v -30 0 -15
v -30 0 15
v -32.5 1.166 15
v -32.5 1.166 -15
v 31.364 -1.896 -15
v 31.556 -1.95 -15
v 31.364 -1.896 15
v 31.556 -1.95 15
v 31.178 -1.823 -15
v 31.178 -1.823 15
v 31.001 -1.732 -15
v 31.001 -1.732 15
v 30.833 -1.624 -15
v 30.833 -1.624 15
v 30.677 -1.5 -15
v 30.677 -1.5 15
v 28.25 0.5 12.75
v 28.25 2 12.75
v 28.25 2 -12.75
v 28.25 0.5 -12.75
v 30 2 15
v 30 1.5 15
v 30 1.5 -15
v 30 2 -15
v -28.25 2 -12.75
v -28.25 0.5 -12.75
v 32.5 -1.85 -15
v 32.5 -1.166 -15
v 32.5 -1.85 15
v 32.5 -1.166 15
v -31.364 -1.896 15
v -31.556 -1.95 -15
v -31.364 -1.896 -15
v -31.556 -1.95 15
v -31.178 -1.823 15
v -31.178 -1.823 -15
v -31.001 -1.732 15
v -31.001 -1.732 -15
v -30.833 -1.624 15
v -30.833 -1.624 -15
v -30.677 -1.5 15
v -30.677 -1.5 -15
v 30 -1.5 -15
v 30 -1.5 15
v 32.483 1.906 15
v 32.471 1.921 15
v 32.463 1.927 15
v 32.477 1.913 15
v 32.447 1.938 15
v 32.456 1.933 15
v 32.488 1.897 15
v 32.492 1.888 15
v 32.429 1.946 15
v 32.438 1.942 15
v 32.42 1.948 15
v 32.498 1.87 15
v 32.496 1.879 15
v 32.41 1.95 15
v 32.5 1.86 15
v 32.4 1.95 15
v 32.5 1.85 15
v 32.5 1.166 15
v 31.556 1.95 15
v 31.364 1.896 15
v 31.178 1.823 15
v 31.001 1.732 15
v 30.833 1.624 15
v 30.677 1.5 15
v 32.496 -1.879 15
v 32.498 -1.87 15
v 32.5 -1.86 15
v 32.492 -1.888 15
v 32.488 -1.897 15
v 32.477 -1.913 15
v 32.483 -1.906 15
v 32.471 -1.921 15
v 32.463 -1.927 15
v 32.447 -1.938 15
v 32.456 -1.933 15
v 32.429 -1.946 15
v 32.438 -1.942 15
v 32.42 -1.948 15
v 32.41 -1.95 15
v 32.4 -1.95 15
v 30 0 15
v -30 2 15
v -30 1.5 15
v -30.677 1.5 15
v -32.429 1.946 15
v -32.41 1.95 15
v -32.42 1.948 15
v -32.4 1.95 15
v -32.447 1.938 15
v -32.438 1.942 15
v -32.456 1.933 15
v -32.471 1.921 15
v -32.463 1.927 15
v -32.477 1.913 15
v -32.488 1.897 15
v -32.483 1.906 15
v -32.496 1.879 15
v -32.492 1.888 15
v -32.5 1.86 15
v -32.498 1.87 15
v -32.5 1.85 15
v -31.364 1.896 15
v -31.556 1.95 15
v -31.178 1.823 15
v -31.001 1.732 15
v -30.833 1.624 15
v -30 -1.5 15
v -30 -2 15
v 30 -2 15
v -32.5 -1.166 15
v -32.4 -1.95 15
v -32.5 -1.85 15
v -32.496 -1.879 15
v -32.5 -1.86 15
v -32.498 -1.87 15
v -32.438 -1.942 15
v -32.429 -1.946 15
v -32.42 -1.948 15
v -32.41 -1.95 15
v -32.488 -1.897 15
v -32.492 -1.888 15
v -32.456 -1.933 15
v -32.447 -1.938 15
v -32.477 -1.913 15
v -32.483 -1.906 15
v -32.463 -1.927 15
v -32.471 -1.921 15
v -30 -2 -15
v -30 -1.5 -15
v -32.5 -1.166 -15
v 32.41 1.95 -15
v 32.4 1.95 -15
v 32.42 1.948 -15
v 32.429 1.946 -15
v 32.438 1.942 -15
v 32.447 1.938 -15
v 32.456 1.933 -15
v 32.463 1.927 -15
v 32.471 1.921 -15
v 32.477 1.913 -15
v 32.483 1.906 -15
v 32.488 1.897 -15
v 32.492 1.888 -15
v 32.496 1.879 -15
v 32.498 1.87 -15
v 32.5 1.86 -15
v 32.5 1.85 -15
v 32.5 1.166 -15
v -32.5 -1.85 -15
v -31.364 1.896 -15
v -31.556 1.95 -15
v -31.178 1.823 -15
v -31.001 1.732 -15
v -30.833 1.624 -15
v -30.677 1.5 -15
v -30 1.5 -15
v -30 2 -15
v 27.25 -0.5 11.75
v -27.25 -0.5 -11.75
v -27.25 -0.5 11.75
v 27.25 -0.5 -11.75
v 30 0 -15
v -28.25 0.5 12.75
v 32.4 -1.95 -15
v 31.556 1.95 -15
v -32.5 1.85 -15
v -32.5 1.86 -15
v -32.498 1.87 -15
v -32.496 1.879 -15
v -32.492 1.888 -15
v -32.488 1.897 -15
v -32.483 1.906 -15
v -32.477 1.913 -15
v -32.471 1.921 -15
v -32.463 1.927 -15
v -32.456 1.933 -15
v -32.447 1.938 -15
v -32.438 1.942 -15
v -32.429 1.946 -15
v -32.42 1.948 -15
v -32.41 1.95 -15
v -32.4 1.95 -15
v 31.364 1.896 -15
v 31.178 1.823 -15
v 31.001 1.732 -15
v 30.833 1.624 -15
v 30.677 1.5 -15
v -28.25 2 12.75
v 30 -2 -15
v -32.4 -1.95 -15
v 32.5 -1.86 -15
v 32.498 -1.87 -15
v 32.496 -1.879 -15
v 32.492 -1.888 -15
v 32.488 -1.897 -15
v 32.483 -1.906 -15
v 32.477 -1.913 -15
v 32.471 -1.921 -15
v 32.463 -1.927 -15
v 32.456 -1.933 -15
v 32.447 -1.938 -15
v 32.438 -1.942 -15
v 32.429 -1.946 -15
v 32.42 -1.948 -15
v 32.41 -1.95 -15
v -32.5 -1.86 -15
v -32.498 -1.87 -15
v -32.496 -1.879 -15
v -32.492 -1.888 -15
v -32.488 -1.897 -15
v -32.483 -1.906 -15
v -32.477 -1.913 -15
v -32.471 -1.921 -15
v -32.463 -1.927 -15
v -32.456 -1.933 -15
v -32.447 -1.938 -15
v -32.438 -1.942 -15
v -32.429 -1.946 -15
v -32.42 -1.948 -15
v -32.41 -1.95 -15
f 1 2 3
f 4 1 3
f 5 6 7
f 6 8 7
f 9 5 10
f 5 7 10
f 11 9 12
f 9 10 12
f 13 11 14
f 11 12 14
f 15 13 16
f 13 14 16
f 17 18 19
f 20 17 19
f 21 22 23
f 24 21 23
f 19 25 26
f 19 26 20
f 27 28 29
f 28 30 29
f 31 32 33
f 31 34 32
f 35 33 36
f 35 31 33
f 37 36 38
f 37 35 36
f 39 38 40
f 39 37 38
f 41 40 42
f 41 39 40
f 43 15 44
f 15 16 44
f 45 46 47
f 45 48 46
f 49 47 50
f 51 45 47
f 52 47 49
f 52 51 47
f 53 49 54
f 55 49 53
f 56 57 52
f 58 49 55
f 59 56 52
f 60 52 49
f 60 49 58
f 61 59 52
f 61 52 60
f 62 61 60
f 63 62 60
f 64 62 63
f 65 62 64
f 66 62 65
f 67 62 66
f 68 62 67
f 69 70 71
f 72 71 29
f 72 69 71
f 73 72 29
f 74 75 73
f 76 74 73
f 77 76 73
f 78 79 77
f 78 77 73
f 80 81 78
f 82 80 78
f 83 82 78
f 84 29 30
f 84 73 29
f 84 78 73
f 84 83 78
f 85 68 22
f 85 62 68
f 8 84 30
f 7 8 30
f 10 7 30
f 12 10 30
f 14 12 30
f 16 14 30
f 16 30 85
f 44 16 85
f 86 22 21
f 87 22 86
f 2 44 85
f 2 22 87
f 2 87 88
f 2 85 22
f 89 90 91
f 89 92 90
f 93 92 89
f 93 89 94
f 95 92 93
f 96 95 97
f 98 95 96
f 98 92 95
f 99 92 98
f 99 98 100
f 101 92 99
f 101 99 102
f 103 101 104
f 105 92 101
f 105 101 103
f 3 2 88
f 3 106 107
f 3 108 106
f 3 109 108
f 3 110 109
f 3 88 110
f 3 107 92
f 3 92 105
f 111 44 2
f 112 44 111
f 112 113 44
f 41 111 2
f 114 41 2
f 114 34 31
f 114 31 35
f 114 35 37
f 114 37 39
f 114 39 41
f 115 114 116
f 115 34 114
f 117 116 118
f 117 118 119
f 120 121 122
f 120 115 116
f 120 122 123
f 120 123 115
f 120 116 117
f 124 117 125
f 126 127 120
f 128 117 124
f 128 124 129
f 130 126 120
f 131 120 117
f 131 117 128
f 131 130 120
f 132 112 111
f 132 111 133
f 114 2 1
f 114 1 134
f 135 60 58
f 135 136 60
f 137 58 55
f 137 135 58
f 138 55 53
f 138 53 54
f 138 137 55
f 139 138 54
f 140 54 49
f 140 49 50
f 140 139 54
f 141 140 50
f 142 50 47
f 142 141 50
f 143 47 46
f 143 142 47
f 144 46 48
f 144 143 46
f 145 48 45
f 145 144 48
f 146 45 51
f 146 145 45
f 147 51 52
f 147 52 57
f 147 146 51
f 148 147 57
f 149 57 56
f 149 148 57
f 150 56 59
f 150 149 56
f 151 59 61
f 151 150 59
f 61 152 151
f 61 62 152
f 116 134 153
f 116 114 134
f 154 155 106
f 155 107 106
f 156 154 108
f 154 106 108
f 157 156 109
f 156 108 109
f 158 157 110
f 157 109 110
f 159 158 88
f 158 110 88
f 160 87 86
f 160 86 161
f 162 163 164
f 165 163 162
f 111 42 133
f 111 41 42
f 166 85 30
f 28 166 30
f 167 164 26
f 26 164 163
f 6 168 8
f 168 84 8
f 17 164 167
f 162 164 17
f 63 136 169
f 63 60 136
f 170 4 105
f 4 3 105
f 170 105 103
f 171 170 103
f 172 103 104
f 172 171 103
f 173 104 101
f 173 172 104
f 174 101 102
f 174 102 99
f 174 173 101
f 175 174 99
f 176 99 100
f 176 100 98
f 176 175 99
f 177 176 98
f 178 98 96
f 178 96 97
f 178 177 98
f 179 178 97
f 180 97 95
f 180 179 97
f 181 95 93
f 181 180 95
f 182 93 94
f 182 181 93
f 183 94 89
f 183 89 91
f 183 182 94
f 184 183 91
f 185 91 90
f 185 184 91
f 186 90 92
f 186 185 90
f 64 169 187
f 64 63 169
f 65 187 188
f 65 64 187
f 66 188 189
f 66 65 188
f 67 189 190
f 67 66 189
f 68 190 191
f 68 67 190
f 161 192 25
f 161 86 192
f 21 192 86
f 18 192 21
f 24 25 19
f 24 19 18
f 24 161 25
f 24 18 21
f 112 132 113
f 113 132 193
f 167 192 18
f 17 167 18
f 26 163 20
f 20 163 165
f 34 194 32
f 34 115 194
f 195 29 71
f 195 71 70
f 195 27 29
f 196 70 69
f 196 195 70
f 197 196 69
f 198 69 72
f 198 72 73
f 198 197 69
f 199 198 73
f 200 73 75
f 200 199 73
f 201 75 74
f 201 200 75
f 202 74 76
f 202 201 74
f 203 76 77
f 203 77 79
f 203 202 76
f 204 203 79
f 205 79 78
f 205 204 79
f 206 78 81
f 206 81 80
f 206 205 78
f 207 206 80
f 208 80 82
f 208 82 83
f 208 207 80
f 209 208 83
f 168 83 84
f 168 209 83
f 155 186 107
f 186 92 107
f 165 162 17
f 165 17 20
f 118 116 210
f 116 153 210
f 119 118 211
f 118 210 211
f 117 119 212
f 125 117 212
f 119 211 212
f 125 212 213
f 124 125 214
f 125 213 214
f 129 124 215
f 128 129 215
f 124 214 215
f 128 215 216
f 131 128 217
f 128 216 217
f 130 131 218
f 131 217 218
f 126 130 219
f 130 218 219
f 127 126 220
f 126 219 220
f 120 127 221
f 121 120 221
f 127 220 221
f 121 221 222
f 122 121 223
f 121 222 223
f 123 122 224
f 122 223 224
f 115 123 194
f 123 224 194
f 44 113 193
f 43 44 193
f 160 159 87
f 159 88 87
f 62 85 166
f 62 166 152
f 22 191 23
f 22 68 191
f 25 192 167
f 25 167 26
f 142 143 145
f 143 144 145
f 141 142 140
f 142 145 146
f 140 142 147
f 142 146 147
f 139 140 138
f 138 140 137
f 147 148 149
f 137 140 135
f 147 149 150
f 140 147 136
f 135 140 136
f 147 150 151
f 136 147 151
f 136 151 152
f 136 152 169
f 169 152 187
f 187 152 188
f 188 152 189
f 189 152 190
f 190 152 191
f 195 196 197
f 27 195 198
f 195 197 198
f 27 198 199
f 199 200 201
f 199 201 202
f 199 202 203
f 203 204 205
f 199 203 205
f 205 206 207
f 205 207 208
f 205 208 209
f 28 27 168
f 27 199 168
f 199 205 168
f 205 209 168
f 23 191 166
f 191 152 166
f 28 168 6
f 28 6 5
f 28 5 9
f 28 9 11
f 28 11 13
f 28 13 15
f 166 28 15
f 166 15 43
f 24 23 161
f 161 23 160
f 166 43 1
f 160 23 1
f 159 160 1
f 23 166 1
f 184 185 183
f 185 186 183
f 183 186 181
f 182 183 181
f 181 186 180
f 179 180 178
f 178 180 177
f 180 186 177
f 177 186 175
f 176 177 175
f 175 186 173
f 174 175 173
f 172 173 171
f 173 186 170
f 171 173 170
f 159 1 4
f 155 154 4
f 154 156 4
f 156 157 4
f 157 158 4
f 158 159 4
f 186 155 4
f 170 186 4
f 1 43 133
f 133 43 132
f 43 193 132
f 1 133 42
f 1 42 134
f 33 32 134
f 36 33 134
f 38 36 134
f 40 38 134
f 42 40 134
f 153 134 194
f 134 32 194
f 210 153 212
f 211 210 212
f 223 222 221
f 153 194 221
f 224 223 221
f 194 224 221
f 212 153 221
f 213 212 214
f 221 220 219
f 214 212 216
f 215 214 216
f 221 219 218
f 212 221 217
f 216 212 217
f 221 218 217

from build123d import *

# Parameters (mm, degrees)
EXTRUDE_1_DEPTH       = 2
EXTRUDE_1_DEPTH_BACK  = 2
SKETCH_1_W            = 60
SKETCH_1_H            = 30
SKETCH_2_W            = 56.5
SKETCH_2_H            = 25.5
CUT_EXTRUDE_1_DEPTH   = 2.5
CHAMFER_1_SIZE        = 1
EXTRUDE_2_DEPTH       = 15
MIRROR_2_COPY_1_DEPTH = 15
FILLET_1_R            = 0.1


with BuildPart() as part:
    # 草图1 → 凸台-拉伸1 (new, two sides: drawn at the far end of the back side and taken through both)
    with BuildSketch(Plane(origin=(0, 0, 0), x_dir=(1, 0, 0), z_dir=(0, 1, 0)).offset(-EXTRUDE_1_DEPTH_BACK)):
        Rectangle(SKETCH_1_W, SKETCH_1_H)
    extrude(amount=EXTRUDE_1_DEPTH + EXTRUDE_1_DEPTH_BACK)

    # 草图2 → 切除-拉伸1 (cut)
    with BuildSketch(Plane(origin=(0, 2, 0), x_dir=(1, 0, 0), z_dir=(0, 1, 0))):
        Rectangle(SKETCH_2_W, SKETCH_2_H)
    extrude(amount=-CUT_EXTRUDE_1_DEPTH, mode=Mode.SUBTRACT)

    # 倒角1
    chamfer_1_edges = [part.edges().sort_by_distance(p)[0] for p in [
        (0, -0.5, -12.75),
        (28.25, -0.5, 0),
        (0, -0.5, 12.75),
        (-28.25, -0.5, 0),
    ]]
    chamfer(chamfer_1_edges, length=CHAMFER_1_SIZE)

    # 草图3 → 凸台-拉伸2 (add, symmetric)
    with BuildSketch(Plane.XY):
        with BuildLine():
            Line((30.677124344, 1.5), (30, 1.5))
            Line((30, 1.5), (30, 0))
            Line((30, 0), (32.5, 1.165769145))
            Line((32.5, 1.165769145), (32.5, 1.95))
            Line((32.5, 1.95), (31.555590279, 1.95))
            ThreePointArc((31.555590279, 1.95), (31.088161527, 1.780042303), (30.677124344, 1.5))
        make_face()
    extrude_2 = extrude(amount=EXTRUDE_2_DEPTH, both=True)

    # 镜向1: 凸台-拉伸2 across plane
    add(extrude_2.mirror(Plane.ZX))

    # 镜向2: 凸台-拉伸2 across plane
    add(extrude_2.mirror(Plane(origin=(0, 0, 0), x_dir=(0, 0, 1), z_dir=(1, 0, 0))))

    # 镜向2 copy 1 sketch → 镜向2 copy 1 (add, symmetric)
    with BuildSketch(Plane(origin=(0, 0, 0), x_dir=(-1, 0, 0), z_dir=(0, 0, 1))):
        with BuildLine():
            Line((30.677124344, 1.5), (30, 1.5))
            Line((30, 1.5), (30, 0))
            Line((30, 0), (32.5, 1.165769145))
            Line((32.5, 1.165769145), (32.5, 1.95))
            Line((32.5, 1.95), (31.555590279, 1.95))
            ThreePointArc((31.555590279, 1.95), (31.088161527, 1.780042303), (30.677124344, 1.5))
        make_face()
    extrude(amount=MIRROR_2_COPY_1_DEPTH, both=True)

    # 圆角1
    fillet_1_edges = [part.edges().sort_by_distance(p)[0] for p in [
        (-32.5, -1.95, 0),
        (32.5, 1.95, 0),
        (32.5, -1.95, 0),
        (-32.5, 1.95, 0),
    ]]
    fillet(fillet_1_edges, radius=FILLET_1_R)


solid = part.part
